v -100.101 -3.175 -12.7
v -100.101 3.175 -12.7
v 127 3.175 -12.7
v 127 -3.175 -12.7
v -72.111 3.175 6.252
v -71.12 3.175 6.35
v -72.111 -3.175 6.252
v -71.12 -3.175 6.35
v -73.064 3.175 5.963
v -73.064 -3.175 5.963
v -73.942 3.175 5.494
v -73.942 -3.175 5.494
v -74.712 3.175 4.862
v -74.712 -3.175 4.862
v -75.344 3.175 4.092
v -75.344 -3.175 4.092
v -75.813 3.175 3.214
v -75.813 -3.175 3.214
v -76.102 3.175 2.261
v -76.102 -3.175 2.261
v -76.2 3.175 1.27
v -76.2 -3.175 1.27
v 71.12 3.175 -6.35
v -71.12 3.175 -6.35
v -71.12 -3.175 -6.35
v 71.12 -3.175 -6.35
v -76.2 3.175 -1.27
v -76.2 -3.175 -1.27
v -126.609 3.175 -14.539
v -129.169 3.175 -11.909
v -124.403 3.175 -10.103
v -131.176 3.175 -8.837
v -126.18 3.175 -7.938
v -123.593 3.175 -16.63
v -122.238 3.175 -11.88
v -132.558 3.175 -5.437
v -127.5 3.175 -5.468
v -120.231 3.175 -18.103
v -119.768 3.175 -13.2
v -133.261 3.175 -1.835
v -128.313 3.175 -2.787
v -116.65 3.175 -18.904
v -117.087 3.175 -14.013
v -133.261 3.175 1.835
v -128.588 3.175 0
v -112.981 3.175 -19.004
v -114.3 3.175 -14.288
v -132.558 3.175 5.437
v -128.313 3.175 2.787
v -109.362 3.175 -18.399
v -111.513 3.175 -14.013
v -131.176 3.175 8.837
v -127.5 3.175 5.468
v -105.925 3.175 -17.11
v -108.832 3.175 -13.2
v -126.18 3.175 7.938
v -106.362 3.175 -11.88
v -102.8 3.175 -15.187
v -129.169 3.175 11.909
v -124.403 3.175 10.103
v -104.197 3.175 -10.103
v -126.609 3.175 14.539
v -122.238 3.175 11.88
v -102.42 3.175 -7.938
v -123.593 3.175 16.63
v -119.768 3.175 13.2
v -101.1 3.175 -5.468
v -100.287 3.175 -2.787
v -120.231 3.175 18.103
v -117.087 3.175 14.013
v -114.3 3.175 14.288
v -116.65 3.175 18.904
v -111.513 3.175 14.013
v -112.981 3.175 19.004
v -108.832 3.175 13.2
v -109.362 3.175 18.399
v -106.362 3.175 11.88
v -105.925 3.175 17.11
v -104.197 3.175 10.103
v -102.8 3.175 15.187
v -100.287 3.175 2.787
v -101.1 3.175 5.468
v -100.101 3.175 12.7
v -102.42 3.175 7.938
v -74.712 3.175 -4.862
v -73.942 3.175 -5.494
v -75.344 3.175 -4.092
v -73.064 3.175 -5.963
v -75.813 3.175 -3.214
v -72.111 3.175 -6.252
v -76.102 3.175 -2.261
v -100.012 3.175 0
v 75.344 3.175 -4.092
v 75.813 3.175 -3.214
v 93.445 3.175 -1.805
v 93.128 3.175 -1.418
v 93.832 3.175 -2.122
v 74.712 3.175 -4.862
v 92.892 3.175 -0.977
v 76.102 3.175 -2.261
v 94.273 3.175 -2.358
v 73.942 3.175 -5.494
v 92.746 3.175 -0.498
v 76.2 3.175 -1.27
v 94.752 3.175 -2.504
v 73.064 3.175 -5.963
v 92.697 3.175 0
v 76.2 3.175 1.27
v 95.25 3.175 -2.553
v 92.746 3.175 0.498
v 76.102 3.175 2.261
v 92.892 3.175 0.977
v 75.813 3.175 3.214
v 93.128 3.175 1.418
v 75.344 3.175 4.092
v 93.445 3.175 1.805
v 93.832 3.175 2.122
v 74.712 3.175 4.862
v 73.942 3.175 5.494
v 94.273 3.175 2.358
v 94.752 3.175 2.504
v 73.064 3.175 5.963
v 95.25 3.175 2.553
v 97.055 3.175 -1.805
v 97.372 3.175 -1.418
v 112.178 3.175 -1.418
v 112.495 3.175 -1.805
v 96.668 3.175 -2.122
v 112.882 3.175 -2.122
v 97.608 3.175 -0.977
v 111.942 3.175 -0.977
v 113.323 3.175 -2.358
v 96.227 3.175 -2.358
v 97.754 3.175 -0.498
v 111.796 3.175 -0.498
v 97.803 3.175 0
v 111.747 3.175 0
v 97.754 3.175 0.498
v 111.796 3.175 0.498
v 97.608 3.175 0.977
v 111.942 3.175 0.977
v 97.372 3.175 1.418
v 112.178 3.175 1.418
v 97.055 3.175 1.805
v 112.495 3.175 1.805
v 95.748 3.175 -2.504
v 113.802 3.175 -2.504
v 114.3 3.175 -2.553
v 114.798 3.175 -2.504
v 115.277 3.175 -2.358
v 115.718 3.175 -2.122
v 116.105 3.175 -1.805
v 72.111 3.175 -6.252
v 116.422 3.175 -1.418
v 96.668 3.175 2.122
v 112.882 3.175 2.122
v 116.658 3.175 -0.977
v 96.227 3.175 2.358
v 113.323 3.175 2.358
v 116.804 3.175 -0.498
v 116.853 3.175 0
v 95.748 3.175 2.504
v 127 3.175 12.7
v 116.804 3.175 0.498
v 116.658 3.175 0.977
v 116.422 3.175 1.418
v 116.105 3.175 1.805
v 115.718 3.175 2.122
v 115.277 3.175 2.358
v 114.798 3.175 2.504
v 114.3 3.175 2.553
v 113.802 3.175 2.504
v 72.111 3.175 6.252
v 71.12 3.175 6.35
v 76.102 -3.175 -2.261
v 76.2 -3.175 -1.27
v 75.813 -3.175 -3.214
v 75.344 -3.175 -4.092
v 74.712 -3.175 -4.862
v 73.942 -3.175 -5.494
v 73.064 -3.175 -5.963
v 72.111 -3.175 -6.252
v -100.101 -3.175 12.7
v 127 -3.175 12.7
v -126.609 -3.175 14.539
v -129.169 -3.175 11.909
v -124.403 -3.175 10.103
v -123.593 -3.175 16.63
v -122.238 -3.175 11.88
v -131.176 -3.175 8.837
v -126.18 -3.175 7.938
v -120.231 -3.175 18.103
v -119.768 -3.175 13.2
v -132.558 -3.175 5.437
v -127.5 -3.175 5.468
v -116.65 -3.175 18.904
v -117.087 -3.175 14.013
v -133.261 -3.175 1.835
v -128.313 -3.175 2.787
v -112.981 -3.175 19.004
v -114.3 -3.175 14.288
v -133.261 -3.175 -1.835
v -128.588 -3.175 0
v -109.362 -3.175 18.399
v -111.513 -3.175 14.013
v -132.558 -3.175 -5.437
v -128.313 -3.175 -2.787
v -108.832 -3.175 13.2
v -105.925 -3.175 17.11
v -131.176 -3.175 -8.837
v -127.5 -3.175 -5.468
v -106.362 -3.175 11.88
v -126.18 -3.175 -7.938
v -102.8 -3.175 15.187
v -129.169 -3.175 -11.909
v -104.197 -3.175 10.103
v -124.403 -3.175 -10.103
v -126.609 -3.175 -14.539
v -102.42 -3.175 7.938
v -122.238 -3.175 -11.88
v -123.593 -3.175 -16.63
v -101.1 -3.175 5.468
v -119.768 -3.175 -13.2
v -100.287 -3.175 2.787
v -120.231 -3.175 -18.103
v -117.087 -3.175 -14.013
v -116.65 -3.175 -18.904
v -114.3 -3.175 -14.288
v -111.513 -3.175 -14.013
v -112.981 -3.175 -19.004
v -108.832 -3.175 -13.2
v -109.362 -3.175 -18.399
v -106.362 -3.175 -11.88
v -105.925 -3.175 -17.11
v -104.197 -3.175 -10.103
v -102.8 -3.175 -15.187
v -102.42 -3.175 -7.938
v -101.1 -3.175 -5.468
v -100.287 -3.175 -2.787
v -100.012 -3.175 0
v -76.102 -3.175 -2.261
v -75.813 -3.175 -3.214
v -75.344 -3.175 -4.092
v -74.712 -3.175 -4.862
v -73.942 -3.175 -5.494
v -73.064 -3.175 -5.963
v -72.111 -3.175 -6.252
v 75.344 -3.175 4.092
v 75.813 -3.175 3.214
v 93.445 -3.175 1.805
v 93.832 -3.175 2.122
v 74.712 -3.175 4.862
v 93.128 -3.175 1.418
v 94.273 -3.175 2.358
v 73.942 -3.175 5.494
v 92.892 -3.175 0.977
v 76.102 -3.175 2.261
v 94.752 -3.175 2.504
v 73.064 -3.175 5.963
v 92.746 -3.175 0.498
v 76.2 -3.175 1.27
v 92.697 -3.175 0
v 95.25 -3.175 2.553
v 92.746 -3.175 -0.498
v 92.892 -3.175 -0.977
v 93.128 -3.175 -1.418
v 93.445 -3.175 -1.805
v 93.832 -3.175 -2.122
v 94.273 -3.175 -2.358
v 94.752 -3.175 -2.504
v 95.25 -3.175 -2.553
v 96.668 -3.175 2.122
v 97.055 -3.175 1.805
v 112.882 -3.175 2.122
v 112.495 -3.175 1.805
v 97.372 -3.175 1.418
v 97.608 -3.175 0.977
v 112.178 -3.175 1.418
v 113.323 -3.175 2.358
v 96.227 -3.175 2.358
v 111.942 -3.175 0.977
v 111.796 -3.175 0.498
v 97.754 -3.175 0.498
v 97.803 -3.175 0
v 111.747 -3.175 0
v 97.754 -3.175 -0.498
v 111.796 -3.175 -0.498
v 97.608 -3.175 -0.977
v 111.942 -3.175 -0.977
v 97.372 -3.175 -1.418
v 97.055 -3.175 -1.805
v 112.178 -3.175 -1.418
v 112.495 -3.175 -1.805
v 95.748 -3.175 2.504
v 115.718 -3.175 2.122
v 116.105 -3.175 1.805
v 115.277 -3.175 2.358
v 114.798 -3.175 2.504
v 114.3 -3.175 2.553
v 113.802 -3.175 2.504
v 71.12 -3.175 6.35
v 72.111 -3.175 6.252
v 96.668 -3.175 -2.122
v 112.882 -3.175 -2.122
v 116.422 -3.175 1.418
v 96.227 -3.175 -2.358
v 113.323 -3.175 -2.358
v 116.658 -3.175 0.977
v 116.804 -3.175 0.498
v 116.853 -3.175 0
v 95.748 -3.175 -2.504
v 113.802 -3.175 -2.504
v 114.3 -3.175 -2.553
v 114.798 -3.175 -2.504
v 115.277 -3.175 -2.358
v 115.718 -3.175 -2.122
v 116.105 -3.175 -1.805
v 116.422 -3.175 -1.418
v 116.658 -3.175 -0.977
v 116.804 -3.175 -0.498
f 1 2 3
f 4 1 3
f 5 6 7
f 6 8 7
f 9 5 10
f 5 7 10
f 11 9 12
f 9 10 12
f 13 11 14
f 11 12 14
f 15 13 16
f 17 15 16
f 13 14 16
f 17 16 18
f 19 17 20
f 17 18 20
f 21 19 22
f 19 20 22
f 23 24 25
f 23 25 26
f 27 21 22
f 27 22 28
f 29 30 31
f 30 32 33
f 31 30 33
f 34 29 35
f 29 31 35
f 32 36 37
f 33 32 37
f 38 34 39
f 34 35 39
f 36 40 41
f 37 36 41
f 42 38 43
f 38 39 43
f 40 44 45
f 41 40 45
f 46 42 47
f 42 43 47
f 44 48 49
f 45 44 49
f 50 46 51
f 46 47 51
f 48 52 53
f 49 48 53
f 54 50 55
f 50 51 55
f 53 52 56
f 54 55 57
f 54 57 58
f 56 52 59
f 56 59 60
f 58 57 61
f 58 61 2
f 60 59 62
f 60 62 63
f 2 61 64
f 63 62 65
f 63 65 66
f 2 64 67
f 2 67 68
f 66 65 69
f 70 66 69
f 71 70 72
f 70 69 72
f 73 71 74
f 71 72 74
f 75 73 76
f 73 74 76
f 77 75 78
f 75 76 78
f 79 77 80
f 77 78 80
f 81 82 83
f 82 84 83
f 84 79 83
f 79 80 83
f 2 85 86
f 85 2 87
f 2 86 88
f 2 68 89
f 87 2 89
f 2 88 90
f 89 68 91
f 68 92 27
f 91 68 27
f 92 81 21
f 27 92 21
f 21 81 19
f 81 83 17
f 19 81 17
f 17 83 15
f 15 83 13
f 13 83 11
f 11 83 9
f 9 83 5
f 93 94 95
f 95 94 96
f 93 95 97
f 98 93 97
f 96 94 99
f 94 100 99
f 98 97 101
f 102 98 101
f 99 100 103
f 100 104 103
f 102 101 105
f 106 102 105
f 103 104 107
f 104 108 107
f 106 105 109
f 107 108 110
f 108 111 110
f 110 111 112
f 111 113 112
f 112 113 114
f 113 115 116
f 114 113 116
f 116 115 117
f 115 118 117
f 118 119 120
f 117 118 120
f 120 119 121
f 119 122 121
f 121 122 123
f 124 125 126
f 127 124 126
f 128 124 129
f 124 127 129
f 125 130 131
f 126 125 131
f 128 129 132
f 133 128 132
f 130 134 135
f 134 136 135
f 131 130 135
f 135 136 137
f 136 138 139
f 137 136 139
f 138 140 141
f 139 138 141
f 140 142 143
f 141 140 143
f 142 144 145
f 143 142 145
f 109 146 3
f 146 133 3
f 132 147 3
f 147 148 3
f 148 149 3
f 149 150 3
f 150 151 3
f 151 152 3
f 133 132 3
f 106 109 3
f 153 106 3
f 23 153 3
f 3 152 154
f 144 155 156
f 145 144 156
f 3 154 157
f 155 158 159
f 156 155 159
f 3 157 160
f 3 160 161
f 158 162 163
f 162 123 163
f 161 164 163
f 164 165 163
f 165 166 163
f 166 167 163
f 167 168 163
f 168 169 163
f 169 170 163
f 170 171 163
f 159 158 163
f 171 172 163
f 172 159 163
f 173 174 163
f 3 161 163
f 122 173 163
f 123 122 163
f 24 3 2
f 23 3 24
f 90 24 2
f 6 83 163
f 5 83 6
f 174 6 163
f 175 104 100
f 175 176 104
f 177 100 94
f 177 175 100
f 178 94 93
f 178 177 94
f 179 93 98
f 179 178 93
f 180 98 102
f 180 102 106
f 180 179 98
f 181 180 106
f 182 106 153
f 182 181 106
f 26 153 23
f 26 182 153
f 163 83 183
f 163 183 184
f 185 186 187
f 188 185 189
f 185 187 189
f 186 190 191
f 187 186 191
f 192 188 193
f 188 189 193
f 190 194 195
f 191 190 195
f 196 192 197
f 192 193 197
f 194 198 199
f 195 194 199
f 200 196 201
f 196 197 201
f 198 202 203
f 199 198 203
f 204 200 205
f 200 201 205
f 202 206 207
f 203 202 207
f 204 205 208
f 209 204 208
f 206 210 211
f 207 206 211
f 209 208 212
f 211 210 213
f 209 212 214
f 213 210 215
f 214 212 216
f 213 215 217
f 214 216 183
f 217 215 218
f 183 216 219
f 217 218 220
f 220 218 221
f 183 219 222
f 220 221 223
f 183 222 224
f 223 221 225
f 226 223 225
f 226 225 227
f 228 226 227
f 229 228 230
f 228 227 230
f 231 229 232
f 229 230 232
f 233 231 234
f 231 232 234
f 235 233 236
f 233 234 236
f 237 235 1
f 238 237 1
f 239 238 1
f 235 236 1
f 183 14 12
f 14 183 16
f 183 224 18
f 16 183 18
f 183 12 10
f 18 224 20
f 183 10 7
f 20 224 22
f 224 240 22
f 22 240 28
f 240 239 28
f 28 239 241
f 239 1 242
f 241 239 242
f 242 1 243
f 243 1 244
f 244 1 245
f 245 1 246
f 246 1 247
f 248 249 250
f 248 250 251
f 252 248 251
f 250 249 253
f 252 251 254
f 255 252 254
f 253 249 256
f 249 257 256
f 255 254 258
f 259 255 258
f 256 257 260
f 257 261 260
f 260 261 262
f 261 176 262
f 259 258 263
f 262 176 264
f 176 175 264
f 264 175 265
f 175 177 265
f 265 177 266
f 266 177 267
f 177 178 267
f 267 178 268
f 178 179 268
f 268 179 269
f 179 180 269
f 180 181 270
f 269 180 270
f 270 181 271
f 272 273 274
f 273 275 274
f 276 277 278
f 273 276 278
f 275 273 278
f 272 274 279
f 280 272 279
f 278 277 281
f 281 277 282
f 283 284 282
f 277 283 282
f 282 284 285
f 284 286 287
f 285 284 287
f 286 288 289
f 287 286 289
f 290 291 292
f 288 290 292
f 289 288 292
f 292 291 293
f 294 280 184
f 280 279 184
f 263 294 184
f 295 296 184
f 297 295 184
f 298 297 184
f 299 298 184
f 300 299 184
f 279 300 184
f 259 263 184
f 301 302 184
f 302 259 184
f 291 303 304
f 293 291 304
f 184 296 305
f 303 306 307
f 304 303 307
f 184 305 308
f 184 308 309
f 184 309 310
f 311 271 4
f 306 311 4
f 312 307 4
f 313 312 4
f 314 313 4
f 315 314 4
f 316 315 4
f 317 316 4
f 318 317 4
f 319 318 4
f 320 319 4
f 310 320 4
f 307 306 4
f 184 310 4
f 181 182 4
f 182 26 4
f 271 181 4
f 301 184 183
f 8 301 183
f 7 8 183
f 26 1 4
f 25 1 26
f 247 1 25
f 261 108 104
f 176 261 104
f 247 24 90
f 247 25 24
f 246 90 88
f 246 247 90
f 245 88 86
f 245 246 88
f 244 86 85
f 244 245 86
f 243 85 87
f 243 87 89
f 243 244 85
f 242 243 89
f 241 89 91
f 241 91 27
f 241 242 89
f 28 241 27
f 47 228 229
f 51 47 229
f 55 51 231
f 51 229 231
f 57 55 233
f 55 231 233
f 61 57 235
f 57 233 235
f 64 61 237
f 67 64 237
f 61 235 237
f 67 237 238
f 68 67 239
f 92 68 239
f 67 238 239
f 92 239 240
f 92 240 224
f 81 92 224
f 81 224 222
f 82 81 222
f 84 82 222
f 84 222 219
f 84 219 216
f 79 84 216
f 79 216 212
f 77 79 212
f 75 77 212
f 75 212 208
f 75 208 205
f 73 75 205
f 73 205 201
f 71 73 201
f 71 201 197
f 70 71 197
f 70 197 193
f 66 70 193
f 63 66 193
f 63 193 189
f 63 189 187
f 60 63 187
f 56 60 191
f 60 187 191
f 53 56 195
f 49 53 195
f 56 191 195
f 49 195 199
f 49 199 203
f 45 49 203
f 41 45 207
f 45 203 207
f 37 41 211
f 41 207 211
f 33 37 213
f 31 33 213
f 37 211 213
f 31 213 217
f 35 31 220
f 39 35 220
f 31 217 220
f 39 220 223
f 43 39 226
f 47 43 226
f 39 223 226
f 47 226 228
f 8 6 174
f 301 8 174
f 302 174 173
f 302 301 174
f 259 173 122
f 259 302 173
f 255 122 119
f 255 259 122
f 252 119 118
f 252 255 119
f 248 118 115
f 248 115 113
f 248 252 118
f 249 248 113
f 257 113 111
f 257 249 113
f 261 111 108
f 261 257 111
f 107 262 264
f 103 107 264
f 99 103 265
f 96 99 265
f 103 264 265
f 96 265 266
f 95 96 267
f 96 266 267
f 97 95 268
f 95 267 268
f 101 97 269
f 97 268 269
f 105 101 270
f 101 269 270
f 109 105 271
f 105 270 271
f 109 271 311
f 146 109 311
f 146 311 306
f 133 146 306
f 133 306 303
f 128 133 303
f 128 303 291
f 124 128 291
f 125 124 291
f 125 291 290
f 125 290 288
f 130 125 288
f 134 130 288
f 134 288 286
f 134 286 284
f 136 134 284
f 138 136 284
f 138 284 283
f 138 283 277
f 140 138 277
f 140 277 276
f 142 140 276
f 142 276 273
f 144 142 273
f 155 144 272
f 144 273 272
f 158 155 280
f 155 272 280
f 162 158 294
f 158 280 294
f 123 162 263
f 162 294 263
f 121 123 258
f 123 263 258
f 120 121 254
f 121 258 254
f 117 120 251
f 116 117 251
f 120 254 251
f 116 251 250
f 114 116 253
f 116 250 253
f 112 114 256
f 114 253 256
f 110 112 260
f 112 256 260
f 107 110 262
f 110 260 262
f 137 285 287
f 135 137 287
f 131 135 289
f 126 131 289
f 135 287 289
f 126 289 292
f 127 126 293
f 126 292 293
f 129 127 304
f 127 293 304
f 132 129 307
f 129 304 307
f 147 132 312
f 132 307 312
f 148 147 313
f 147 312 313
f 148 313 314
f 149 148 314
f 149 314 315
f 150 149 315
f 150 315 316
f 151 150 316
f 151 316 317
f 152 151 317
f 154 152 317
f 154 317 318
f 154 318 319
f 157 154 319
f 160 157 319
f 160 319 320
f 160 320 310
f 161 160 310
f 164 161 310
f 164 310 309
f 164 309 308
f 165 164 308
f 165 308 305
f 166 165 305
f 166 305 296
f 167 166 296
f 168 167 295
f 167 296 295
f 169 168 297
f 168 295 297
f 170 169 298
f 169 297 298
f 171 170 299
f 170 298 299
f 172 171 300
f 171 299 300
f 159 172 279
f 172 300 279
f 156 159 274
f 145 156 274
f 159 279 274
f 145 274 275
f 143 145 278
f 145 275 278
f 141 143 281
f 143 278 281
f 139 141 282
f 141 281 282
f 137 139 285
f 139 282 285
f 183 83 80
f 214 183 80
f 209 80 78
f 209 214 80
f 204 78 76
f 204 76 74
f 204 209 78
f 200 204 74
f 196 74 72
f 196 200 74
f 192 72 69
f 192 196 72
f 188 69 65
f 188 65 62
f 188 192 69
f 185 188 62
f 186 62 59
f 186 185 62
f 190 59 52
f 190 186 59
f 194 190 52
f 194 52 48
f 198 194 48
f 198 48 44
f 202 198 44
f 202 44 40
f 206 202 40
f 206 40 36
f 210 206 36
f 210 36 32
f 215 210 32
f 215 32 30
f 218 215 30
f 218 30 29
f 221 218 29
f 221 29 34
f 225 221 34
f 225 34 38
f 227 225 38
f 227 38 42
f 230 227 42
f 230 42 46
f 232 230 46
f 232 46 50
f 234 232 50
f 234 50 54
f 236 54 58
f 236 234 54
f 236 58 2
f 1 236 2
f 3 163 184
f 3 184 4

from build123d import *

# Parameters (mm, degrees)
SKETCH1_W              = 254
SKETCH1_H              = 25.4
BOSS_EXTRUDE1_DEPTH    = 3.175
FILLET1_R              = 12.7
F_10_CLEARANCE_HOLE1_D = 5.1054
SKETCH9_W              = 152.4
SKETCH9_H              = 12.7
CUT_EXTRUDE2_DEPTH     = 128.791284914
FILLET2_R              = 5.08
SKETCH11_R             = 19.05
BOSS_EXTRUDE2_DEPTH    = 6.35
SKETCH10_R             = 14.2875
CUT_EXTRUDE3_DEPTH     = 135.853429693


with BuildPart() as part:
    # Sketch1 → Boss-Extrude1 (new, symmetric)
    with BuildSketch(Plane(origin=(0, 0, 0), x_dir=(1, 0, 0), z_dir=(0, 1, 0))):
        Rectangle(SKETCH1_W, SKETCH1_H)
    extrude(amount=BOSS_EXTRUDE1_DEPTH, both=True)

    # Fillet1
    fillet1_edges = [part.edges().sort_by_distance(p)[0] for p in [
        (-127, 0, -12.7),
        (-127, 0, 12.7),
    ]]
    fillet(fillet1_edges, radius=FILLET1_R - 0.0001)  # a hair under: the kernel refuses the full size

    # #10 Clearance Hole1 (through all)
    with Locations(Plane(origin=(0, 3.175, 0), x_dir=(1, 0, 0), z_dir=(0, 1, 0))):
        with Locations((114.3, 0), (95.25, 0)):
            Hole(F_10_CLEARANCE_HOLE1_D / 2)

    # Sketch9 → Cut-Extrude2 (cut, through all)
    with BuildSketch(Plane(origin=(0, 3.175, 0), x_dir=(1, 0, 0), z_dir=(0, 1, 0))):
        Rectangle(SKETCH9_W, SKETCH9_H)
    extrude(amount=-CUT_EXTRUDE2_DEPTH, mode=Mode.SUBTRACT)

    # Fillet2
    fillet2_edges = [part.edges().sort_by_distance(p)[0] for p in [
        (76.2, 0, -6.35),
        (76.2, 0, 6.35),
        (-76.2, 0, 6.35),
        (-76.2, 0, -6.35),
    ]]
    fillet(fillet2_edges, radius=FILLET2_R)

    # Sketch11 → Boss-Extrude2 (add)
    with BuildSketch(Plane.XZ.offset(3.175)):
        with Locations((-114.3, 0)):
            Circle(SKETCH11_R)
    extrude(amount=-BOSS_EXTRUDE2_DEPTH)

    # Sketch10 → Cut-Extrude3 (cut, through all)
    with BuildSketch(Plane.XZ.offset(3.175)):
        with Locations(Location((-114.3, 0, 0), (0, 0, 270))):
            Circle(SKETCH10_R)
    extrude(amount=-CUT_EXTRUDE3_DEPTH, mode=Mode.SUBTRACT)


solid = part.part
